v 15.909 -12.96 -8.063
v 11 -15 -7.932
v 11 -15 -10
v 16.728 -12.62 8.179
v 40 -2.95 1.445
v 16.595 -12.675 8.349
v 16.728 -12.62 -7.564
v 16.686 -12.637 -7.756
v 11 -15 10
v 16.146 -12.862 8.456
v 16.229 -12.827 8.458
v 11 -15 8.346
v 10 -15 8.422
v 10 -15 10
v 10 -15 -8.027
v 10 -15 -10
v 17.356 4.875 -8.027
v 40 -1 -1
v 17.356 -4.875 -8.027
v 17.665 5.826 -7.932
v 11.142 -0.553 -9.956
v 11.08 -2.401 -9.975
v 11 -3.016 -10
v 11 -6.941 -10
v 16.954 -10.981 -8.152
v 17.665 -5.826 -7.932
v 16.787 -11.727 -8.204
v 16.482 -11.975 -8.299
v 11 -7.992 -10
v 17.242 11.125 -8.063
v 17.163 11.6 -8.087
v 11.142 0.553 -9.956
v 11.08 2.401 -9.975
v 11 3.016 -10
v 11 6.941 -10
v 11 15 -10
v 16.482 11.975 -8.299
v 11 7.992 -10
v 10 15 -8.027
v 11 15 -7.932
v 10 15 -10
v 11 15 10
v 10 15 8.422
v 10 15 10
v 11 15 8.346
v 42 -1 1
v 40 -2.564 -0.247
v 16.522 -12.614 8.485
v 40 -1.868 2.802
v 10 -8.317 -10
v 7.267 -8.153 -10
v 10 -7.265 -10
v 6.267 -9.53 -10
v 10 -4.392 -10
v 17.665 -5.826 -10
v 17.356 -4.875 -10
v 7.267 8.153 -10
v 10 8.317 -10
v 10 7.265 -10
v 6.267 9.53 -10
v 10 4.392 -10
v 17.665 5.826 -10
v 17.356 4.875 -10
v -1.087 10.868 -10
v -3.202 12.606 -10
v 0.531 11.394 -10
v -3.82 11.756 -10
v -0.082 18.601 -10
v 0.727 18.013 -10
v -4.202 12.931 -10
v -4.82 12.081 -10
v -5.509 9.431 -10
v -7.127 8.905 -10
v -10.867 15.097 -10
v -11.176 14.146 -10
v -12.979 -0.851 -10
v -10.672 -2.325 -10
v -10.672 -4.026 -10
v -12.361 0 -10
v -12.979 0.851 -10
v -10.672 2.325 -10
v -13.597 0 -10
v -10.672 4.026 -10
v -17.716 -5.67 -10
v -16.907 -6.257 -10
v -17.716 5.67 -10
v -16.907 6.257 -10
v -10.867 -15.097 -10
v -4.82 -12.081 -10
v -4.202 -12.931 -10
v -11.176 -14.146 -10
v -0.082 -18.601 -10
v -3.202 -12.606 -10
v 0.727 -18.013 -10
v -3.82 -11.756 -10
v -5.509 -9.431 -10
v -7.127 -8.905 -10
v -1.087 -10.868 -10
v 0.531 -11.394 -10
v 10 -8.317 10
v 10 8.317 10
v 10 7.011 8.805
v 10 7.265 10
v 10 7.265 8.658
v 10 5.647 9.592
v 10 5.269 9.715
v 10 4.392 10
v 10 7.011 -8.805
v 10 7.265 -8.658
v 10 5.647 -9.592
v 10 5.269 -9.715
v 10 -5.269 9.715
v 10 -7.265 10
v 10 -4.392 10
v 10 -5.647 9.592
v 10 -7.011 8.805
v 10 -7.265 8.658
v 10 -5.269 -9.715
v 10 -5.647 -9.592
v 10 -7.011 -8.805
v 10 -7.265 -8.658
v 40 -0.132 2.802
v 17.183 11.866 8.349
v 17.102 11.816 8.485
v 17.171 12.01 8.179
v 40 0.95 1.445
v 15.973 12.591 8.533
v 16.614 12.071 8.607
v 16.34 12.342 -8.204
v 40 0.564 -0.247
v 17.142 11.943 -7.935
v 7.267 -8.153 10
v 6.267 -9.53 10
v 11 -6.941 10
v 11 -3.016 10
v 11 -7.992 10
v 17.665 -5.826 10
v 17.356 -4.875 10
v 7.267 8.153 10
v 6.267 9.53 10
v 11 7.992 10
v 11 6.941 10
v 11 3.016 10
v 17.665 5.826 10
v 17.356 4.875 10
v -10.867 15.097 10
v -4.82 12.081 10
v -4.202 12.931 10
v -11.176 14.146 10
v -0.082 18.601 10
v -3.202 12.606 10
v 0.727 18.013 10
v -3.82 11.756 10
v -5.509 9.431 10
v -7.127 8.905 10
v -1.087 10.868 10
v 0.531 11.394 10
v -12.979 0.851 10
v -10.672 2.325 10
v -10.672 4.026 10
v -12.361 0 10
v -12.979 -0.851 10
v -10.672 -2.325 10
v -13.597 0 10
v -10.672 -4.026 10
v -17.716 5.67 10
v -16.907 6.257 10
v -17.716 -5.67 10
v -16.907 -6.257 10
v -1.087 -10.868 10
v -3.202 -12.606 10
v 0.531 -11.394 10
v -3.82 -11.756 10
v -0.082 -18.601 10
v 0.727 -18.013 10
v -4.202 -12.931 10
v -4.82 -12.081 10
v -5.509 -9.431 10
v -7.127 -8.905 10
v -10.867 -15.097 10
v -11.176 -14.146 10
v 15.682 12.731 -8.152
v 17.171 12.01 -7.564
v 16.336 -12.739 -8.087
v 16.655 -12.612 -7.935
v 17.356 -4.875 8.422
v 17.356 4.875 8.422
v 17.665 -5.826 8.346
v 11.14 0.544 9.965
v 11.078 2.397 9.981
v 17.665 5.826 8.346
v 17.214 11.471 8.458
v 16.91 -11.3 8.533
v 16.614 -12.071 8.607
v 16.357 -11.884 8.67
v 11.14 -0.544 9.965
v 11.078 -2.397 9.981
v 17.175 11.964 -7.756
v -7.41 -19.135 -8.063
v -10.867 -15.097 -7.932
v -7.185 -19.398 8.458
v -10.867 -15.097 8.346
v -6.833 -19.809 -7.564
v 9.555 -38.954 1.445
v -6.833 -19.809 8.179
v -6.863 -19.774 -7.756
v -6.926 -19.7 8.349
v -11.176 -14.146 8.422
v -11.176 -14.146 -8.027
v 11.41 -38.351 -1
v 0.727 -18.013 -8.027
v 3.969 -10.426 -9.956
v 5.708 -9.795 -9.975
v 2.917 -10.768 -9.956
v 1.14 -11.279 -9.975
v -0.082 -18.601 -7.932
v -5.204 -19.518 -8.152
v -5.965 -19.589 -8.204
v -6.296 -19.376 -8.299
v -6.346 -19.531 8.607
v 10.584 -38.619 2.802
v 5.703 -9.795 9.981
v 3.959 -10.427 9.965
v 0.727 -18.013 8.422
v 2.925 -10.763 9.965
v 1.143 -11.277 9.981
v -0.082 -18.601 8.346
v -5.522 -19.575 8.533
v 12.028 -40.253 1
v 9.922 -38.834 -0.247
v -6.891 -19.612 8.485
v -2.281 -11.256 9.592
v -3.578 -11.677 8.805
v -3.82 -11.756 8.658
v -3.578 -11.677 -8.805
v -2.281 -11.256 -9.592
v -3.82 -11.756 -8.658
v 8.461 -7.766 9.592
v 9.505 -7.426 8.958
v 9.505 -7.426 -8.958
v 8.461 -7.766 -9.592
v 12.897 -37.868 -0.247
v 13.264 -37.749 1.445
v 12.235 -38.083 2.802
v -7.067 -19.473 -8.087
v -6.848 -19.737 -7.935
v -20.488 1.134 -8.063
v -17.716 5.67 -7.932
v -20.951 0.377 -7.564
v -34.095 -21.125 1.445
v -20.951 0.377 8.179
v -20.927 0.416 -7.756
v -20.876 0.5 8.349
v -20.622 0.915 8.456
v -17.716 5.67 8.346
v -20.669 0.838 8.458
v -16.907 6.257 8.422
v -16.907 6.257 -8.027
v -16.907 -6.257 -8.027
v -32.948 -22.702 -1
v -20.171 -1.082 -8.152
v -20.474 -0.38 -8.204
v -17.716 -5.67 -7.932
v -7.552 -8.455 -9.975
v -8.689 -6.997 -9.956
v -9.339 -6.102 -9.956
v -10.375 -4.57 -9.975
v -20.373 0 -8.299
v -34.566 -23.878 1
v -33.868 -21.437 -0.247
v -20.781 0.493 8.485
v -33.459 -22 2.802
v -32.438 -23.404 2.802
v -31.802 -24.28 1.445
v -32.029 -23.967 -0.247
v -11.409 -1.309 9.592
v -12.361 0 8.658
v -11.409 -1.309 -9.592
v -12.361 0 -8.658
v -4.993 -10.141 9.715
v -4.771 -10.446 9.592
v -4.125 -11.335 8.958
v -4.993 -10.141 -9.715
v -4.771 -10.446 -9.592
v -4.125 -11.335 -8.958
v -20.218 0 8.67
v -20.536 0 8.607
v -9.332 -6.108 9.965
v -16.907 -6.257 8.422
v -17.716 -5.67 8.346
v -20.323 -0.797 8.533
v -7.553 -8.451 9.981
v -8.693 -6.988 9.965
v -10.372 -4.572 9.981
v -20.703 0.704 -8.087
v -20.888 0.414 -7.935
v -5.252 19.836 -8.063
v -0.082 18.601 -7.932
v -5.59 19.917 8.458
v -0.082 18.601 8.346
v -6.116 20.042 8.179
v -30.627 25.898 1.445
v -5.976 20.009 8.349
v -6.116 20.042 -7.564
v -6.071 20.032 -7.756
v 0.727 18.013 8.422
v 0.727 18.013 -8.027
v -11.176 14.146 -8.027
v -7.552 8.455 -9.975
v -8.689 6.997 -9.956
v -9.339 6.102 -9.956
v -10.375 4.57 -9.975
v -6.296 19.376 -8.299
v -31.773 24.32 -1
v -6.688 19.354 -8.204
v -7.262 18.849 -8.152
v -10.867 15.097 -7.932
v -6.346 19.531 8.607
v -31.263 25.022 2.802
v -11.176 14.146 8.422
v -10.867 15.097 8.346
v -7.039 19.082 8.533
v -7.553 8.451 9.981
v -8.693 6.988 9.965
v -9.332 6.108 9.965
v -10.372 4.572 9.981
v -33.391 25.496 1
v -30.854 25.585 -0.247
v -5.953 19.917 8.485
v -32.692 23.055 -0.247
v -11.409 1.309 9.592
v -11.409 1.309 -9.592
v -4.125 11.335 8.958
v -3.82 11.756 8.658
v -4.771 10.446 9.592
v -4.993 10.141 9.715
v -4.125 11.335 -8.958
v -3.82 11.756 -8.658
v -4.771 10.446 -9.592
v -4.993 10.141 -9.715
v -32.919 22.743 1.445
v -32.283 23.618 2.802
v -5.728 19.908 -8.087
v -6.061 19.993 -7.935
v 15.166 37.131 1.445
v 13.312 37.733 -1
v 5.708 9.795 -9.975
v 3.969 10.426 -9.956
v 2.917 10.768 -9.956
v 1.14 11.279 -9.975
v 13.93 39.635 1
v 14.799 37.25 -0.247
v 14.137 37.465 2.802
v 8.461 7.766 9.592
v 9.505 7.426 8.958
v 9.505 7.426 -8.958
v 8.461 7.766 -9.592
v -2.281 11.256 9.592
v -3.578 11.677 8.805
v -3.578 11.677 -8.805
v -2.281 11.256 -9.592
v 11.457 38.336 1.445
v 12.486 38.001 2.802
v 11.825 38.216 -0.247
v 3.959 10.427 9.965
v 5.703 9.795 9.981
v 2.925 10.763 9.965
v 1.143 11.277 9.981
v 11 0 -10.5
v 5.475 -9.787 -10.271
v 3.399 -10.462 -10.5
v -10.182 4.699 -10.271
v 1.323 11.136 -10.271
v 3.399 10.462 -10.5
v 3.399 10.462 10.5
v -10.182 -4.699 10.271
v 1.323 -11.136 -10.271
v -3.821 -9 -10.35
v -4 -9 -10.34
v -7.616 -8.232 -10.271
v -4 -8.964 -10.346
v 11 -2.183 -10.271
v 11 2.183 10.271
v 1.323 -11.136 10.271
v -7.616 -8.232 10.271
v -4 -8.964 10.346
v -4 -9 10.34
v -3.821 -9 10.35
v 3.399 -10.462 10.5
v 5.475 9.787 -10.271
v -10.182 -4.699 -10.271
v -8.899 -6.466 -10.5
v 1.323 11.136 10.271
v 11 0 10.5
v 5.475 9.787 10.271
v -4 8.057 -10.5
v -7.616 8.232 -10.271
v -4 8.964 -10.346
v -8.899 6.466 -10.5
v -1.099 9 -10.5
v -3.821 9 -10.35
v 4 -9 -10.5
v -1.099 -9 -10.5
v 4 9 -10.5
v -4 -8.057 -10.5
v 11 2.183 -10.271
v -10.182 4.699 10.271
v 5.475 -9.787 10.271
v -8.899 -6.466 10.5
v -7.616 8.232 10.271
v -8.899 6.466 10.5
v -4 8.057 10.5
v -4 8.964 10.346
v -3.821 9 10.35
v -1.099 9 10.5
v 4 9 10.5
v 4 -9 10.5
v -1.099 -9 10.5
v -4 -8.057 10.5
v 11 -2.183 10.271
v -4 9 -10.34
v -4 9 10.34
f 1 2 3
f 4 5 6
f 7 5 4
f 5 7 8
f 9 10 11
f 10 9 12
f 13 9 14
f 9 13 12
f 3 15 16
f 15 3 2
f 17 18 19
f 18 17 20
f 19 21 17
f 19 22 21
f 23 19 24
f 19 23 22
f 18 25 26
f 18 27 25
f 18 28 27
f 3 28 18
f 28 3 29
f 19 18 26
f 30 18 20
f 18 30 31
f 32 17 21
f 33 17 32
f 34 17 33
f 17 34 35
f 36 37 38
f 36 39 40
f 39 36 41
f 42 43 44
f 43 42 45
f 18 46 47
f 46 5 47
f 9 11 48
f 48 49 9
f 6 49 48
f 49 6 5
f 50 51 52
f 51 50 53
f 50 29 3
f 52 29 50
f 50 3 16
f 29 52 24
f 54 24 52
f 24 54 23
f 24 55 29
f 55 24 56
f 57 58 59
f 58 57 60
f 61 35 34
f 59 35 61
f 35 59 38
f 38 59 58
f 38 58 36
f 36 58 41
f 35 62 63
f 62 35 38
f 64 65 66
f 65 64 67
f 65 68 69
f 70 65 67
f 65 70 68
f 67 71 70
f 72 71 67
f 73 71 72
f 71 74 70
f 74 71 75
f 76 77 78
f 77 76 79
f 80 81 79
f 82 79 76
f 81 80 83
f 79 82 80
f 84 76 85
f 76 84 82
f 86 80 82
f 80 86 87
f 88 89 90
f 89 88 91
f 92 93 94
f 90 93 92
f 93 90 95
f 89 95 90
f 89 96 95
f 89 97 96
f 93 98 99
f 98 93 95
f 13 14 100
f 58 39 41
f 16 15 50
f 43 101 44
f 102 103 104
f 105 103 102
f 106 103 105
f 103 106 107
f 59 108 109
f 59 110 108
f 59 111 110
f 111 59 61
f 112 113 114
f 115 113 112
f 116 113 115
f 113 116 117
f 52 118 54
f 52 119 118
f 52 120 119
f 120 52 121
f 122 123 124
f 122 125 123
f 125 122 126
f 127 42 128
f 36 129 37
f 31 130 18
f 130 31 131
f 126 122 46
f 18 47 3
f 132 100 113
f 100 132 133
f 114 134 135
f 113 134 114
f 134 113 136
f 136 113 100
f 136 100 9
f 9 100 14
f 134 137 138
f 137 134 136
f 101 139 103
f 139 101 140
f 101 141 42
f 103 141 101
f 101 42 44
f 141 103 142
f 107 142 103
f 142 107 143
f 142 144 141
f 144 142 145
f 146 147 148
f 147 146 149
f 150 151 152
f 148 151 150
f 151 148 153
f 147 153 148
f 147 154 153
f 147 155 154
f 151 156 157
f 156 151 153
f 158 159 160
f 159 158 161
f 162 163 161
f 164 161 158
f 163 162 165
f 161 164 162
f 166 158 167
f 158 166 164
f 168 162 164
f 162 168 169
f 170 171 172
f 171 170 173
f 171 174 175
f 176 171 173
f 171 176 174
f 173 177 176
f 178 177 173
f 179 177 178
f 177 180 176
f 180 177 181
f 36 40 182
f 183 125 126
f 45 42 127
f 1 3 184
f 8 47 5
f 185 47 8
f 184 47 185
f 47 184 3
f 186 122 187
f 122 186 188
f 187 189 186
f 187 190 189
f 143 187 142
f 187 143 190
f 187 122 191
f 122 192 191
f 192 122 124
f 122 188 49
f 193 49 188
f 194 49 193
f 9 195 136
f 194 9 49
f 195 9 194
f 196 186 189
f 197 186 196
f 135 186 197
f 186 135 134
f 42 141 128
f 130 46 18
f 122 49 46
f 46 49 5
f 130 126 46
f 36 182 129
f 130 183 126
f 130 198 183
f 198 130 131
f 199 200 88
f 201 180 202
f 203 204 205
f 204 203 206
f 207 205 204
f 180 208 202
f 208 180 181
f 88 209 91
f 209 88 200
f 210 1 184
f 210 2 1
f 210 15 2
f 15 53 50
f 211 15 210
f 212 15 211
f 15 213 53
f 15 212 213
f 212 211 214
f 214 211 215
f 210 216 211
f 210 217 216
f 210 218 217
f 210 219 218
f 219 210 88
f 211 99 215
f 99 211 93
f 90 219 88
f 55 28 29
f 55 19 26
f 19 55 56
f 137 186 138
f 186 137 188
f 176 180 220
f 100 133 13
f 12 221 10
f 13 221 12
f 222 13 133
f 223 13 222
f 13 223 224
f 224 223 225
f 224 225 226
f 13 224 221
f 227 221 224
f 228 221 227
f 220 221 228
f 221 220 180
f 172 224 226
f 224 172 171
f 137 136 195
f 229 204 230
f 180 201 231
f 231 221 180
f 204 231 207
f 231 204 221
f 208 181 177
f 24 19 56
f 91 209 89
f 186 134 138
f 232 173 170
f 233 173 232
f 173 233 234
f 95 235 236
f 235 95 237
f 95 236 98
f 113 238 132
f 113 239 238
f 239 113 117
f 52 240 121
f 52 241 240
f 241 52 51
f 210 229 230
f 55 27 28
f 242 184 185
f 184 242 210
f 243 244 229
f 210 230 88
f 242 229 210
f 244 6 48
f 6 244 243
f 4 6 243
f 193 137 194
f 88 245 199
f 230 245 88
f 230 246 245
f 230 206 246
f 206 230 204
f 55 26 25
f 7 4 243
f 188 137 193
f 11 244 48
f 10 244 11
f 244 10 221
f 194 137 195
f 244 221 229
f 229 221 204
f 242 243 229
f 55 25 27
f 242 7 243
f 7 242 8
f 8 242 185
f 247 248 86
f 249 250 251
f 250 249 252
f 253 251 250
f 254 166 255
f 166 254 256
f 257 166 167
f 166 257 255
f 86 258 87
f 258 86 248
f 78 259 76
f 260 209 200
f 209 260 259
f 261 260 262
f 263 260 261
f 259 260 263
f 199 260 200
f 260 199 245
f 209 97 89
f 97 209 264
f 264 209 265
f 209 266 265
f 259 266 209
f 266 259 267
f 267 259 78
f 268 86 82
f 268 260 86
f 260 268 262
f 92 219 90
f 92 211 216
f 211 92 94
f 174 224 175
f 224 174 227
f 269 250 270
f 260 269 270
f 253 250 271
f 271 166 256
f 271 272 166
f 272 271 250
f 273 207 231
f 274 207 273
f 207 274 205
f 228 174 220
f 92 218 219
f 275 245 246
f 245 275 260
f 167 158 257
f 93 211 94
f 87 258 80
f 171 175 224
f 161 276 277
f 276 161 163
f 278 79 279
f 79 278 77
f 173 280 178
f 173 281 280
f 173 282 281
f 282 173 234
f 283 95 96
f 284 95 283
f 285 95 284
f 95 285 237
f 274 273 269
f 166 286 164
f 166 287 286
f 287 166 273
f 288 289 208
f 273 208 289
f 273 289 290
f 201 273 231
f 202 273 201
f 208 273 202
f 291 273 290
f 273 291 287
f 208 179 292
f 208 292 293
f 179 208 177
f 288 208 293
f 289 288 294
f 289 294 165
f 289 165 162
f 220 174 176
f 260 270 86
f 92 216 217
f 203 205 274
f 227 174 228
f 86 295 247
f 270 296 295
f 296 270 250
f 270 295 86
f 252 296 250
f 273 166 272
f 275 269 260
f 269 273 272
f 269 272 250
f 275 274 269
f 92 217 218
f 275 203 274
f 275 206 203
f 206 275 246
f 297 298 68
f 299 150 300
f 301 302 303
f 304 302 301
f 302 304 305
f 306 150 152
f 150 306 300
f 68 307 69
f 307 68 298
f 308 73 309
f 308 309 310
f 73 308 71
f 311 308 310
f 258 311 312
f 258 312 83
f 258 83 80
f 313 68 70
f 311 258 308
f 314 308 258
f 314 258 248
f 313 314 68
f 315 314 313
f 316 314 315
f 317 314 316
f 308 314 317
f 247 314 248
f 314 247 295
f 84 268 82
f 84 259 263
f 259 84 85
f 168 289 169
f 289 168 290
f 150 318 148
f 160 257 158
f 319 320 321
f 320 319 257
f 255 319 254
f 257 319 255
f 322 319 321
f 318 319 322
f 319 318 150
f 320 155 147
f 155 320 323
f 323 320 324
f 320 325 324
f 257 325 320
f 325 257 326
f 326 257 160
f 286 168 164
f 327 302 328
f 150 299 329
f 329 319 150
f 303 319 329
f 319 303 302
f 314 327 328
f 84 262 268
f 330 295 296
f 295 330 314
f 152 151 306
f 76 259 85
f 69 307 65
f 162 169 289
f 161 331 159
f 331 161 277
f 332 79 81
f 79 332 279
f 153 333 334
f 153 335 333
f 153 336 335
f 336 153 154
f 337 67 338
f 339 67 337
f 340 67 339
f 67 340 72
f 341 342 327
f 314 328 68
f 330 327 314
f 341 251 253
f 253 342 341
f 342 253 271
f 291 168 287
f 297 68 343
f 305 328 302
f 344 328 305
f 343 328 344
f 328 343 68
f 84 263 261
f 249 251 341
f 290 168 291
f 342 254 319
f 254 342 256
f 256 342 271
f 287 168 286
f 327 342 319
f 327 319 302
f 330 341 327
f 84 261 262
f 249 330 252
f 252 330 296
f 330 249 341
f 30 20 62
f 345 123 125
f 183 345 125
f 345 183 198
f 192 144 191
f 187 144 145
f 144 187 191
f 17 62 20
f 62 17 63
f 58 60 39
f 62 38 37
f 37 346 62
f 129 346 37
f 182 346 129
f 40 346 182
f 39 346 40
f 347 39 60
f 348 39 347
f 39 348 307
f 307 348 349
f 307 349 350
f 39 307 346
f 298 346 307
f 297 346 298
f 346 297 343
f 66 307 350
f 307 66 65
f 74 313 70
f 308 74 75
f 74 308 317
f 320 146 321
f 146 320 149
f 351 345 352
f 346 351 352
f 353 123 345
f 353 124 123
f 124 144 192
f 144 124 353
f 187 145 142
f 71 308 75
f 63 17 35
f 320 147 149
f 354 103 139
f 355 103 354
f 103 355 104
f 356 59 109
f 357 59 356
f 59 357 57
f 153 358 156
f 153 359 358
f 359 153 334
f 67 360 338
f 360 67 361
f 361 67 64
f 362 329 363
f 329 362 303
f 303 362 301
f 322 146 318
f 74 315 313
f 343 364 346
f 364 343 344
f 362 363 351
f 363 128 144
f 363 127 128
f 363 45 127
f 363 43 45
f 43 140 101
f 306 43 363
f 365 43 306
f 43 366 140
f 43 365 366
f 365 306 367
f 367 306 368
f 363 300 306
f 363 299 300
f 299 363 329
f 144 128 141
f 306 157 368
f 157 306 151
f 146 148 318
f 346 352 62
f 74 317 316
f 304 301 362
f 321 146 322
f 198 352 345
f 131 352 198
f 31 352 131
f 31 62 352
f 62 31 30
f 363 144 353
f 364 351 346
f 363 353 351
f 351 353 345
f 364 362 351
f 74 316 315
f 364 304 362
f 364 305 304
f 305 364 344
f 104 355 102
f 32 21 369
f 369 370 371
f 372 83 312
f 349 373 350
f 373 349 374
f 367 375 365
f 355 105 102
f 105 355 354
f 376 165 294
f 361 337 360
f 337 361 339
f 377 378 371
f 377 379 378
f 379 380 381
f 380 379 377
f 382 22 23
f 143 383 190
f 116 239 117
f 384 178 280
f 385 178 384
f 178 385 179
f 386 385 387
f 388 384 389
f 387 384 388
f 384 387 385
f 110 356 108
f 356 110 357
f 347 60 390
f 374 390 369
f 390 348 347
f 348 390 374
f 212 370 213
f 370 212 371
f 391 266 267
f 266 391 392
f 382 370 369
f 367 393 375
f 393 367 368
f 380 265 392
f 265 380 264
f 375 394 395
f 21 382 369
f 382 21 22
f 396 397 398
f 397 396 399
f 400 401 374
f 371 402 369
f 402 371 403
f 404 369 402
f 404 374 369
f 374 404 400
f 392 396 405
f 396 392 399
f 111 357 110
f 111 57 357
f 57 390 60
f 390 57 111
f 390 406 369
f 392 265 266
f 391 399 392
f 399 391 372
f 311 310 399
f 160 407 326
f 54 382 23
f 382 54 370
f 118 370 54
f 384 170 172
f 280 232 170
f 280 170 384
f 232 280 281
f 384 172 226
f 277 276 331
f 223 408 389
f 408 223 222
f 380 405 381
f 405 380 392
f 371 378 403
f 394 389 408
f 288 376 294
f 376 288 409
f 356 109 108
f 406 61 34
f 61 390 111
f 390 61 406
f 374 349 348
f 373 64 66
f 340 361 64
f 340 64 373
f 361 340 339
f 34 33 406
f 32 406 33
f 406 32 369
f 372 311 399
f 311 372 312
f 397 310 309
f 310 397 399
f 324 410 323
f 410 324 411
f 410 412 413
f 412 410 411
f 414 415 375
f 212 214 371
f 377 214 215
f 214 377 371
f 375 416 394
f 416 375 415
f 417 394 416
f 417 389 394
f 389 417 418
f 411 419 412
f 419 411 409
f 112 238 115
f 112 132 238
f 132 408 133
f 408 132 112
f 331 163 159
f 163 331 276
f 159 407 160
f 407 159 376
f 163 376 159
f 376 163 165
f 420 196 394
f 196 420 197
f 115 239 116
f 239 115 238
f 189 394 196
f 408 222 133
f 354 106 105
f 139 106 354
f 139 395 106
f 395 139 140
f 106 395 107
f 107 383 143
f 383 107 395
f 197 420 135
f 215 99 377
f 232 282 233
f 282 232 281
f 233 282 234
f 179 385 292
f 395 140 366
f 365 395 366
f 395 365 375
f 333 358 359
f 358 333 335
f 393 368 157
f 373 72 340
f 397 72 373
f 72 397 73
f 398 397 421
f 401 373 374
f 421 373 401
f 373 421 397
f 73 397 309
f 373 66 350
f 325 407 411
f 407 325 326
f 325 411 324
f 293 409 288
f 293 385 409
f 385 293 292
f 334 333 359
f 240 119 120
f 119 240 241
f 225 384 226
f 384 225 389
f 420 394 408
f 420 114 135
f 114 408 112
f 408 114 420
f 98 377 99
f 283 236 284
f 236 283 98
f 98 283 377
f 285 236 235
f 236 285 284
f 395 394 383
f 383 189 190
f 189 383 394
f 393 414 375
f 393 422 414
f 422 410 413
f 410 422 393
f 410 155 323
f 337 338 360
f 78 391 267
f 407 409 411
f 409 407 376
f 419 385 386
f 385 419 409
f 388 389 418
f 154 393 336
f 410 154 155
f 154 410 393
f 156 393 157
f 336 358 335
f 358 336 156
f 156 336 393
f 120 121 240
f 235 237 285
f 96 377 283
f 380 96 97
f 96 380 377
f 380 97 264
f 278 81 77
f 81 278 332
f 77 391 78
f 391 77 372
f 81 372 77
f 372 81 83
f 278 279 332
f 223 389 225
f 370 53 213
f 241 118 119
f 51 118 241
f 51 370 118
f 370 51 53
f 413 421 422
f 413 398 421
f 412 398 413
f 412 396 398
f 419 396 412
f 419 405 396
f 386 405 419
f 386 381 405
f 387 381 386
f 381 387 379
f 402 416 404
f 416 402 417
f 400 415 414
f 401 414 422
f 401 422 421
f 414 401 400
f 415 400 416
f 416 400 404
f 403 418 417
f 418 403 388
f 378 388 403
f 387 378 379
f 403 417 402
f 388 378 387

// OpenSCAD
module spike() {
  translate([-10,-15,10]) hull() {
    cube([20,30,1]);
    translate([9,14,30]) cylinder(2,2,0);
  }
}

module round_spike() {
  translate([0,0,10]) cylinder(30,10,0);
}

module star() {
  difference() {
    union() {
      // Create all the points
      for (i = [0 : 72 : 360]) {
        rotate(i, [1,0,0]) spike();
      }
      // Centre solid
      hull() {
        for (i = [0 : 72 : 360]) {
          rotate(i, [1,0,0]) translate([0,0,10]) linear_extrude(height=1) circle(r=10.5);
        }
      }
    }
    // The cut-out for the LED strip
    // Use either the following line...
    rotate([0,90,0]) translate([-4,-9,-20]) cube([8,18,40]);
    // ...or this union (if you want to double-up the star
    // LEDs to feed it back through the star)
    //union() {
    //  translate([0,0,6]) rotate([0,90,0]) translate([-2.5,-8,-20]) cube([5,16,40]);
    //  translate([0,0,-6]) rotate([0,90,0]) translate([-2.5,-8,-20]) cube([5,16,40]);
    //}
  }
}

// Now split it in half (and flip it) for easier 3D printing
rotate([0,90,0])
difference() {
 star();
 //translate([0,-50,-50]) cube([30,100,100]);
}
// Reference cylinder (to check we're the right side of the origin :-)
//cylinder(100,4,4);
